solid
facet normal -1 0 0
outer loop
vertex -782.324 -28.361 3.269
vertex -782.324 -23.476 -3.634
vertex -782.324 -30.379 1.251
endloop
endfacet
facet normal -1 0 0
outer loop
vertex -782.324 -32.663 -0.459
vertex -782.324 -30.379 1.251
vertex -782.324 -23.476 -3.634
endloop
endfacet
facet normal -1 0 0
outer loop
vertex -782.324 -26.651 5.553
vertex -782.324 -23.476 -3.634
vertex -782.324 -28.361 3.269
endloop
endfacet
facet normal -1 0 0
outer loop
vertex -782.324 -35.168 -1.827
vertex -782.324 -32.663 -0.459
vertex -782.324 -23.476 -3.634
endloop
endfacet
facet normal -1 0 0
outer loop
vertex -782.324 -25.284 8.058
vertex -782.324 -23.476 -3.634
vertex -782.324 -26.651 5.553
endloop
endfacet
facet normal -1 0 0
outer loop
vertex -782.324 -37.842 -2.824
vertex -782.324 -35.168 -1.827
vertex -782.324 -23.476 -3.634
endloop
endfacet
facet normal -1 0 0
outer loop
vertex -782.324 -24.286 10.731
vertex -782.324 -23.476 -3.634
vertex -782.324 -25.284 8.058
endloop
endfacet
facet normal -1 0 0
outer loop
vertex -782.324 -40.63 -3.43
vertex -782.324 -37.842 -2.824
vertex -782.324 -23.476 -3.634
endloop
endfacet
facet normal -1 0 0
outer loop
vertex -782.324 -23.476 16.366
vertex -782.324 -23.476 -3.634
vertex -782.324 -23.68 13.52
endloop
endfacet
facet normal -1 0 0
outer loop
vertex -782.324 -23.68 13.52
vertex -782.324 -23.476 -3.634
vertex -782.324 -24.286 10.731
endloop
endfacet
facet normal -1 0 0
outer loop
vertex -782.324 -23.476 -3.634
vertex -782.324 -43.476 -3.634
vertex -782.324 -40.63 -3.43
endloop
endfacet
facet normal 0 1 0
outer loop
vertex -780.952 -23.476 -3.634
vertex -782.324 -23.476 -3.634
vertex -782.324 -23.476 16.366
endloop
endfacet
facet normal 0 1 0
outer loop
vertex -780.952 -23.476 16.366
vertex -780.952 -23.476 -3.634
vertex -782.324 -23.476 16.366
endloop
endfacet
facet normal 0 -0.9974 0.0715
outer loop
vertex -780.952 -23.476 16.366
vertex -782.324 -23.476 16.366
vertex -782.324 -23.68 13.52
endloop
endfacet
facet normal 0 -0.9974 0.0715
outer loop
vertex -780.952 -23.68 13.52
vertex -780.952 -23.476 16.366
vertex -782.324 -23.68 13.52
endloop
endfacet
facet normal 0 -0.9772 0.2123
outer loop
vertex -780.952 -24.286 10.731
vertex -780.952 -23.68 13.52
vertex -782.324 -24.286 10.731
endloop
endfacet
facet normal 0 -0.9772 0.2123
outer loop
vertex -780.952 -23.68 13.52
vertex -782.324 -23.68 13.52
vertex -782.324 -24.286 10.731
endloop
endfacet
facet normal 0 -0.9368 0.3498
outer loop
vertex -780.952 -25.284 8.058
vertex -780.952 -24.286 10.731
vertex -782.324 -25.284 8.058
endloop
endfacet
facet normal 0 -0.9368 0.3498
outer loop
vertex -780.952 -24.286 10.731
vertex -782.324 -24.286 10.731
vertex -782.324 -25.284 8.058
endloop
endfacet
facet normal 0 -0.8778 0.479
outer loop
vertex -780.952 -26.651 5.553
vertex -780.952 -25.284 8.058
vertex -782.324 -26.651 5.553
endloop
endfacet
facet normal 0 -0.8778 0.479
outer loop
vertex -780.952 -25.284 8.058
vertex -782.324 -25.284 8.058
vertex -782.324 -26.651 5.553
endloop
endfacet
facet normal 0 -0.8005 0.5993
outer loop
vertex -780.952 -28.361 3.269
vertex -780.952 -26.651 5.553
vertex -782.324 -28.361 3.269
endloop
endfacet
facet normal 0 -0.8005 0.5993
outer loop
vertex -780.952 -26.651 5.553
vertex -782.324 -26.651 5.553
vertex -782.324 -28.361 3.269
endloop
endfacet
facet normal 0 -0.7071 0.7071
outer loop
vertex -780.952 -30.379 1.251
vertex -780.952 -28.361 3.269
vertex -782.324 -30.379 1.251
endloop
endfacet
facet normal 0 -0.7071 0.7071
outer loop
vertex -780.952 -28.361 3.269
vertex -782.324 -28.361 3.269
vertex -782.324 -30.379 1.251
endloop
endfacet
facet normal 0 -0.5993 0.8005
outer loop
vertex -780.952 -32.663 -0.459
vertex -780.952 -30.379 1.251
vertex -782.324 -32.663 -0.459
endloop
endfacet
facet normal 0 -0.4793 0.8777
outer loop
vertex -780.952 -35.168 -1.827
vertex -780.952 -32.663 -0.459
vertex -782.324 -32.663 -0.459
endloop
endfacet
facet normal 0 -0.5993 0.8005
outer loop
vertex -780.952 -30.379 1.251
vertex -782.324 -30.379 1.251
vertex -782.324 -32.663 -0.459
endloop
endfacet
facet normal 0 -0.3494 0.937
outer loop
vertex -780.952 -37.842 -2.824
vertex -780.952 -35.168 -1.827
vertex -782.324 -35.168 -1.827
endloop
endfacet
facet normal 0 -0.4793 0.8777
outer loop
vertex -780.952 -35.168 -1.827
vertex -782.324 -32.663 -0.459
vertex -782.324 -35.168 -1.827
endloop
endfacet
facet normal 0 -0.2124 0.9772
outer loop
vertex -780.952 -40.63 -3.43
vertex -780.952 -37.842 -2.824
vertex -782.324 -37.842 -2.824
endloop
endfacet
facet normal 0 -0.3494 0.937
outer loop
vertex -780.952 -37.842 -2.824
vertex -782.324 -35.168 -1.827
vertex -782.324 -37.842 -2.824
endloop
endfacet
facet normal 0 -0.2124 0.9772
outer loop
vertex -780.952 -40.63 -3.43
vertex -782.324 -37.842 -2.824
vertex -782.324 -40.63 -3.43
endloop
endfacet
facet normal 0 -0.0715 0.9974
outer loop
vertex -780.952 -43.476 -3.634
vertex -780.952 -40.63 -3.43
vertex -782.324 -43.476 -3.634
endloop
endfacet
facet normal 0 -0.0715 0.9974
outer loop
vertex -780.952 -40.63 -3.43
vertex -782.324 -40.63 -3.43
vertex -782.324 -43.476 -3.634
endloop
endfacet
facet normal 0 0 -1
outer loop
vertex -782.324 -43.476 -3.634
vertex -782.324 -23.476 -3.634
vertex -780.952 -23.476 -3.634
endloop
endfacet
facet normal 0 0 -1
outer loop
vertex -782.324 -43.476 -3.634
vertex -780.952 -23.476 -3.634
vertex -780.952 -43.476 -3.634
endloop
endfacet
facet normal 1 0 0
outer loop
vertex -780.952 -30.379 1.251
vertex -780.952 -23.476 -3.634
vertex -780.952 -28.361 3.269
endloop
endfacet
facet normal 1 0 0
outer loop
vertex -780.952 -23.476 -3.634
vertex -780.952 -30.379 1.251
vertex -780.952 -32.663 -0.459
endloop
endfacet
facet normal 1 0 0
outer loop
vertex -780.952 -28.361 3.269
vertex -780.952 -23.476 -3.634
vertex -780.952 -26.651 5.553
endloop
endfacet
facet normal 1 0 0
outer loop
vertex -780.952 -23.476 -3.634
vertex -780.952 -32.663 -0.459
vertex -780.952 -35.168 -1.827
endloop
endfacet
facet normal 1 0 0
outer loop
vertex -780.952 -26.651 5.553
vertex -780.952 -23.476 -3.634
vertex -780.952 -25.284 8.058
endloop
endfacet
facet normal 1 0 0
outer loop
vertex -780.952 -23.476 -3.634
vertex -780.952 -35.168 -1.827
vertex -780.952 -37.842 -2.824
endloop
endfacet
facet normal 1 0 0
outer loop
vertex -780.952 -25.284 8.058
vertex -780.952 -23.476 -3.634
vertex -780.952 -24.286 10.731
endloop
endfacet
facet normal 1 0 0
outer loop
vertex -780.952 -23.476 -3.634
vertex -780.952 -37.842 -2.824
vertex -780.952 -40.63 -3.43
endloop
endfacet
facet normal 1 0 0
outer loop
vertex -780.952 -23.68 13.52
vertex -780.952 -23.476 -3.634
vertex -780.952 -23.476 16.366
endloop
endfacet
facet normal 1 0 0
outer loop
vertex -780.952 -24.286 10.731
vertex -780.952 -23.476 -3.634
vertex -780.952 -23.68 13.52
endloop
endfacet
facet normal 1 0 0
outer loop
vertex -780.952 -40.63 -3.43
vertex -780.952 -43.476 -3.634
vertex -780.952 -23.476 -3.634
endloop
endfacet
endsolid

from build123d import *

# Parameters (mm, degrees)
CIRCLE006_R        = 20
EXTRUSION023_DEPTH = 1.371598
RECTANGLE013_W     = 20
RECTANGLE013_H     = 20
EXTRUSION022_DEPTH = 1.371598


with BuildPart() as extrusion023:
    # Circle006 (on Rectangle) → Extrusion023 (new body)
    with BuildSketch(Plane(origin=(-782.323582, -43.476219, 16.366052), x_dir=(0, -1, 0), z_dir=(-1, 0, 0))):
        Circle(CIRCLE006_R)
    extrude(amount=-EXTRUSION023_DEPTH)


with BuildPart() as cut004006005004002008019023005025006:
    # Rectangle013 → Extrusion022 (new body)
    with BuildSketch(Plane(origin=(-782.323582, -23.476219, -3.633948), x_dir=(0, -1, 0), z_dir=(-1, 0, 0))):
        with Locations((10, 10)):
            Rectangle(RECTANGLE013_W, RECTANGLE013_H)
    extrude(amount=-EXTRUSION022_DEPTH)

    # Cut004006005004002008019023005025006: cut Extrusion023
    add(extrusion023.part, mode=Mode.SUBTRACT)


solid = cut004006005004002008019023005025006.part
